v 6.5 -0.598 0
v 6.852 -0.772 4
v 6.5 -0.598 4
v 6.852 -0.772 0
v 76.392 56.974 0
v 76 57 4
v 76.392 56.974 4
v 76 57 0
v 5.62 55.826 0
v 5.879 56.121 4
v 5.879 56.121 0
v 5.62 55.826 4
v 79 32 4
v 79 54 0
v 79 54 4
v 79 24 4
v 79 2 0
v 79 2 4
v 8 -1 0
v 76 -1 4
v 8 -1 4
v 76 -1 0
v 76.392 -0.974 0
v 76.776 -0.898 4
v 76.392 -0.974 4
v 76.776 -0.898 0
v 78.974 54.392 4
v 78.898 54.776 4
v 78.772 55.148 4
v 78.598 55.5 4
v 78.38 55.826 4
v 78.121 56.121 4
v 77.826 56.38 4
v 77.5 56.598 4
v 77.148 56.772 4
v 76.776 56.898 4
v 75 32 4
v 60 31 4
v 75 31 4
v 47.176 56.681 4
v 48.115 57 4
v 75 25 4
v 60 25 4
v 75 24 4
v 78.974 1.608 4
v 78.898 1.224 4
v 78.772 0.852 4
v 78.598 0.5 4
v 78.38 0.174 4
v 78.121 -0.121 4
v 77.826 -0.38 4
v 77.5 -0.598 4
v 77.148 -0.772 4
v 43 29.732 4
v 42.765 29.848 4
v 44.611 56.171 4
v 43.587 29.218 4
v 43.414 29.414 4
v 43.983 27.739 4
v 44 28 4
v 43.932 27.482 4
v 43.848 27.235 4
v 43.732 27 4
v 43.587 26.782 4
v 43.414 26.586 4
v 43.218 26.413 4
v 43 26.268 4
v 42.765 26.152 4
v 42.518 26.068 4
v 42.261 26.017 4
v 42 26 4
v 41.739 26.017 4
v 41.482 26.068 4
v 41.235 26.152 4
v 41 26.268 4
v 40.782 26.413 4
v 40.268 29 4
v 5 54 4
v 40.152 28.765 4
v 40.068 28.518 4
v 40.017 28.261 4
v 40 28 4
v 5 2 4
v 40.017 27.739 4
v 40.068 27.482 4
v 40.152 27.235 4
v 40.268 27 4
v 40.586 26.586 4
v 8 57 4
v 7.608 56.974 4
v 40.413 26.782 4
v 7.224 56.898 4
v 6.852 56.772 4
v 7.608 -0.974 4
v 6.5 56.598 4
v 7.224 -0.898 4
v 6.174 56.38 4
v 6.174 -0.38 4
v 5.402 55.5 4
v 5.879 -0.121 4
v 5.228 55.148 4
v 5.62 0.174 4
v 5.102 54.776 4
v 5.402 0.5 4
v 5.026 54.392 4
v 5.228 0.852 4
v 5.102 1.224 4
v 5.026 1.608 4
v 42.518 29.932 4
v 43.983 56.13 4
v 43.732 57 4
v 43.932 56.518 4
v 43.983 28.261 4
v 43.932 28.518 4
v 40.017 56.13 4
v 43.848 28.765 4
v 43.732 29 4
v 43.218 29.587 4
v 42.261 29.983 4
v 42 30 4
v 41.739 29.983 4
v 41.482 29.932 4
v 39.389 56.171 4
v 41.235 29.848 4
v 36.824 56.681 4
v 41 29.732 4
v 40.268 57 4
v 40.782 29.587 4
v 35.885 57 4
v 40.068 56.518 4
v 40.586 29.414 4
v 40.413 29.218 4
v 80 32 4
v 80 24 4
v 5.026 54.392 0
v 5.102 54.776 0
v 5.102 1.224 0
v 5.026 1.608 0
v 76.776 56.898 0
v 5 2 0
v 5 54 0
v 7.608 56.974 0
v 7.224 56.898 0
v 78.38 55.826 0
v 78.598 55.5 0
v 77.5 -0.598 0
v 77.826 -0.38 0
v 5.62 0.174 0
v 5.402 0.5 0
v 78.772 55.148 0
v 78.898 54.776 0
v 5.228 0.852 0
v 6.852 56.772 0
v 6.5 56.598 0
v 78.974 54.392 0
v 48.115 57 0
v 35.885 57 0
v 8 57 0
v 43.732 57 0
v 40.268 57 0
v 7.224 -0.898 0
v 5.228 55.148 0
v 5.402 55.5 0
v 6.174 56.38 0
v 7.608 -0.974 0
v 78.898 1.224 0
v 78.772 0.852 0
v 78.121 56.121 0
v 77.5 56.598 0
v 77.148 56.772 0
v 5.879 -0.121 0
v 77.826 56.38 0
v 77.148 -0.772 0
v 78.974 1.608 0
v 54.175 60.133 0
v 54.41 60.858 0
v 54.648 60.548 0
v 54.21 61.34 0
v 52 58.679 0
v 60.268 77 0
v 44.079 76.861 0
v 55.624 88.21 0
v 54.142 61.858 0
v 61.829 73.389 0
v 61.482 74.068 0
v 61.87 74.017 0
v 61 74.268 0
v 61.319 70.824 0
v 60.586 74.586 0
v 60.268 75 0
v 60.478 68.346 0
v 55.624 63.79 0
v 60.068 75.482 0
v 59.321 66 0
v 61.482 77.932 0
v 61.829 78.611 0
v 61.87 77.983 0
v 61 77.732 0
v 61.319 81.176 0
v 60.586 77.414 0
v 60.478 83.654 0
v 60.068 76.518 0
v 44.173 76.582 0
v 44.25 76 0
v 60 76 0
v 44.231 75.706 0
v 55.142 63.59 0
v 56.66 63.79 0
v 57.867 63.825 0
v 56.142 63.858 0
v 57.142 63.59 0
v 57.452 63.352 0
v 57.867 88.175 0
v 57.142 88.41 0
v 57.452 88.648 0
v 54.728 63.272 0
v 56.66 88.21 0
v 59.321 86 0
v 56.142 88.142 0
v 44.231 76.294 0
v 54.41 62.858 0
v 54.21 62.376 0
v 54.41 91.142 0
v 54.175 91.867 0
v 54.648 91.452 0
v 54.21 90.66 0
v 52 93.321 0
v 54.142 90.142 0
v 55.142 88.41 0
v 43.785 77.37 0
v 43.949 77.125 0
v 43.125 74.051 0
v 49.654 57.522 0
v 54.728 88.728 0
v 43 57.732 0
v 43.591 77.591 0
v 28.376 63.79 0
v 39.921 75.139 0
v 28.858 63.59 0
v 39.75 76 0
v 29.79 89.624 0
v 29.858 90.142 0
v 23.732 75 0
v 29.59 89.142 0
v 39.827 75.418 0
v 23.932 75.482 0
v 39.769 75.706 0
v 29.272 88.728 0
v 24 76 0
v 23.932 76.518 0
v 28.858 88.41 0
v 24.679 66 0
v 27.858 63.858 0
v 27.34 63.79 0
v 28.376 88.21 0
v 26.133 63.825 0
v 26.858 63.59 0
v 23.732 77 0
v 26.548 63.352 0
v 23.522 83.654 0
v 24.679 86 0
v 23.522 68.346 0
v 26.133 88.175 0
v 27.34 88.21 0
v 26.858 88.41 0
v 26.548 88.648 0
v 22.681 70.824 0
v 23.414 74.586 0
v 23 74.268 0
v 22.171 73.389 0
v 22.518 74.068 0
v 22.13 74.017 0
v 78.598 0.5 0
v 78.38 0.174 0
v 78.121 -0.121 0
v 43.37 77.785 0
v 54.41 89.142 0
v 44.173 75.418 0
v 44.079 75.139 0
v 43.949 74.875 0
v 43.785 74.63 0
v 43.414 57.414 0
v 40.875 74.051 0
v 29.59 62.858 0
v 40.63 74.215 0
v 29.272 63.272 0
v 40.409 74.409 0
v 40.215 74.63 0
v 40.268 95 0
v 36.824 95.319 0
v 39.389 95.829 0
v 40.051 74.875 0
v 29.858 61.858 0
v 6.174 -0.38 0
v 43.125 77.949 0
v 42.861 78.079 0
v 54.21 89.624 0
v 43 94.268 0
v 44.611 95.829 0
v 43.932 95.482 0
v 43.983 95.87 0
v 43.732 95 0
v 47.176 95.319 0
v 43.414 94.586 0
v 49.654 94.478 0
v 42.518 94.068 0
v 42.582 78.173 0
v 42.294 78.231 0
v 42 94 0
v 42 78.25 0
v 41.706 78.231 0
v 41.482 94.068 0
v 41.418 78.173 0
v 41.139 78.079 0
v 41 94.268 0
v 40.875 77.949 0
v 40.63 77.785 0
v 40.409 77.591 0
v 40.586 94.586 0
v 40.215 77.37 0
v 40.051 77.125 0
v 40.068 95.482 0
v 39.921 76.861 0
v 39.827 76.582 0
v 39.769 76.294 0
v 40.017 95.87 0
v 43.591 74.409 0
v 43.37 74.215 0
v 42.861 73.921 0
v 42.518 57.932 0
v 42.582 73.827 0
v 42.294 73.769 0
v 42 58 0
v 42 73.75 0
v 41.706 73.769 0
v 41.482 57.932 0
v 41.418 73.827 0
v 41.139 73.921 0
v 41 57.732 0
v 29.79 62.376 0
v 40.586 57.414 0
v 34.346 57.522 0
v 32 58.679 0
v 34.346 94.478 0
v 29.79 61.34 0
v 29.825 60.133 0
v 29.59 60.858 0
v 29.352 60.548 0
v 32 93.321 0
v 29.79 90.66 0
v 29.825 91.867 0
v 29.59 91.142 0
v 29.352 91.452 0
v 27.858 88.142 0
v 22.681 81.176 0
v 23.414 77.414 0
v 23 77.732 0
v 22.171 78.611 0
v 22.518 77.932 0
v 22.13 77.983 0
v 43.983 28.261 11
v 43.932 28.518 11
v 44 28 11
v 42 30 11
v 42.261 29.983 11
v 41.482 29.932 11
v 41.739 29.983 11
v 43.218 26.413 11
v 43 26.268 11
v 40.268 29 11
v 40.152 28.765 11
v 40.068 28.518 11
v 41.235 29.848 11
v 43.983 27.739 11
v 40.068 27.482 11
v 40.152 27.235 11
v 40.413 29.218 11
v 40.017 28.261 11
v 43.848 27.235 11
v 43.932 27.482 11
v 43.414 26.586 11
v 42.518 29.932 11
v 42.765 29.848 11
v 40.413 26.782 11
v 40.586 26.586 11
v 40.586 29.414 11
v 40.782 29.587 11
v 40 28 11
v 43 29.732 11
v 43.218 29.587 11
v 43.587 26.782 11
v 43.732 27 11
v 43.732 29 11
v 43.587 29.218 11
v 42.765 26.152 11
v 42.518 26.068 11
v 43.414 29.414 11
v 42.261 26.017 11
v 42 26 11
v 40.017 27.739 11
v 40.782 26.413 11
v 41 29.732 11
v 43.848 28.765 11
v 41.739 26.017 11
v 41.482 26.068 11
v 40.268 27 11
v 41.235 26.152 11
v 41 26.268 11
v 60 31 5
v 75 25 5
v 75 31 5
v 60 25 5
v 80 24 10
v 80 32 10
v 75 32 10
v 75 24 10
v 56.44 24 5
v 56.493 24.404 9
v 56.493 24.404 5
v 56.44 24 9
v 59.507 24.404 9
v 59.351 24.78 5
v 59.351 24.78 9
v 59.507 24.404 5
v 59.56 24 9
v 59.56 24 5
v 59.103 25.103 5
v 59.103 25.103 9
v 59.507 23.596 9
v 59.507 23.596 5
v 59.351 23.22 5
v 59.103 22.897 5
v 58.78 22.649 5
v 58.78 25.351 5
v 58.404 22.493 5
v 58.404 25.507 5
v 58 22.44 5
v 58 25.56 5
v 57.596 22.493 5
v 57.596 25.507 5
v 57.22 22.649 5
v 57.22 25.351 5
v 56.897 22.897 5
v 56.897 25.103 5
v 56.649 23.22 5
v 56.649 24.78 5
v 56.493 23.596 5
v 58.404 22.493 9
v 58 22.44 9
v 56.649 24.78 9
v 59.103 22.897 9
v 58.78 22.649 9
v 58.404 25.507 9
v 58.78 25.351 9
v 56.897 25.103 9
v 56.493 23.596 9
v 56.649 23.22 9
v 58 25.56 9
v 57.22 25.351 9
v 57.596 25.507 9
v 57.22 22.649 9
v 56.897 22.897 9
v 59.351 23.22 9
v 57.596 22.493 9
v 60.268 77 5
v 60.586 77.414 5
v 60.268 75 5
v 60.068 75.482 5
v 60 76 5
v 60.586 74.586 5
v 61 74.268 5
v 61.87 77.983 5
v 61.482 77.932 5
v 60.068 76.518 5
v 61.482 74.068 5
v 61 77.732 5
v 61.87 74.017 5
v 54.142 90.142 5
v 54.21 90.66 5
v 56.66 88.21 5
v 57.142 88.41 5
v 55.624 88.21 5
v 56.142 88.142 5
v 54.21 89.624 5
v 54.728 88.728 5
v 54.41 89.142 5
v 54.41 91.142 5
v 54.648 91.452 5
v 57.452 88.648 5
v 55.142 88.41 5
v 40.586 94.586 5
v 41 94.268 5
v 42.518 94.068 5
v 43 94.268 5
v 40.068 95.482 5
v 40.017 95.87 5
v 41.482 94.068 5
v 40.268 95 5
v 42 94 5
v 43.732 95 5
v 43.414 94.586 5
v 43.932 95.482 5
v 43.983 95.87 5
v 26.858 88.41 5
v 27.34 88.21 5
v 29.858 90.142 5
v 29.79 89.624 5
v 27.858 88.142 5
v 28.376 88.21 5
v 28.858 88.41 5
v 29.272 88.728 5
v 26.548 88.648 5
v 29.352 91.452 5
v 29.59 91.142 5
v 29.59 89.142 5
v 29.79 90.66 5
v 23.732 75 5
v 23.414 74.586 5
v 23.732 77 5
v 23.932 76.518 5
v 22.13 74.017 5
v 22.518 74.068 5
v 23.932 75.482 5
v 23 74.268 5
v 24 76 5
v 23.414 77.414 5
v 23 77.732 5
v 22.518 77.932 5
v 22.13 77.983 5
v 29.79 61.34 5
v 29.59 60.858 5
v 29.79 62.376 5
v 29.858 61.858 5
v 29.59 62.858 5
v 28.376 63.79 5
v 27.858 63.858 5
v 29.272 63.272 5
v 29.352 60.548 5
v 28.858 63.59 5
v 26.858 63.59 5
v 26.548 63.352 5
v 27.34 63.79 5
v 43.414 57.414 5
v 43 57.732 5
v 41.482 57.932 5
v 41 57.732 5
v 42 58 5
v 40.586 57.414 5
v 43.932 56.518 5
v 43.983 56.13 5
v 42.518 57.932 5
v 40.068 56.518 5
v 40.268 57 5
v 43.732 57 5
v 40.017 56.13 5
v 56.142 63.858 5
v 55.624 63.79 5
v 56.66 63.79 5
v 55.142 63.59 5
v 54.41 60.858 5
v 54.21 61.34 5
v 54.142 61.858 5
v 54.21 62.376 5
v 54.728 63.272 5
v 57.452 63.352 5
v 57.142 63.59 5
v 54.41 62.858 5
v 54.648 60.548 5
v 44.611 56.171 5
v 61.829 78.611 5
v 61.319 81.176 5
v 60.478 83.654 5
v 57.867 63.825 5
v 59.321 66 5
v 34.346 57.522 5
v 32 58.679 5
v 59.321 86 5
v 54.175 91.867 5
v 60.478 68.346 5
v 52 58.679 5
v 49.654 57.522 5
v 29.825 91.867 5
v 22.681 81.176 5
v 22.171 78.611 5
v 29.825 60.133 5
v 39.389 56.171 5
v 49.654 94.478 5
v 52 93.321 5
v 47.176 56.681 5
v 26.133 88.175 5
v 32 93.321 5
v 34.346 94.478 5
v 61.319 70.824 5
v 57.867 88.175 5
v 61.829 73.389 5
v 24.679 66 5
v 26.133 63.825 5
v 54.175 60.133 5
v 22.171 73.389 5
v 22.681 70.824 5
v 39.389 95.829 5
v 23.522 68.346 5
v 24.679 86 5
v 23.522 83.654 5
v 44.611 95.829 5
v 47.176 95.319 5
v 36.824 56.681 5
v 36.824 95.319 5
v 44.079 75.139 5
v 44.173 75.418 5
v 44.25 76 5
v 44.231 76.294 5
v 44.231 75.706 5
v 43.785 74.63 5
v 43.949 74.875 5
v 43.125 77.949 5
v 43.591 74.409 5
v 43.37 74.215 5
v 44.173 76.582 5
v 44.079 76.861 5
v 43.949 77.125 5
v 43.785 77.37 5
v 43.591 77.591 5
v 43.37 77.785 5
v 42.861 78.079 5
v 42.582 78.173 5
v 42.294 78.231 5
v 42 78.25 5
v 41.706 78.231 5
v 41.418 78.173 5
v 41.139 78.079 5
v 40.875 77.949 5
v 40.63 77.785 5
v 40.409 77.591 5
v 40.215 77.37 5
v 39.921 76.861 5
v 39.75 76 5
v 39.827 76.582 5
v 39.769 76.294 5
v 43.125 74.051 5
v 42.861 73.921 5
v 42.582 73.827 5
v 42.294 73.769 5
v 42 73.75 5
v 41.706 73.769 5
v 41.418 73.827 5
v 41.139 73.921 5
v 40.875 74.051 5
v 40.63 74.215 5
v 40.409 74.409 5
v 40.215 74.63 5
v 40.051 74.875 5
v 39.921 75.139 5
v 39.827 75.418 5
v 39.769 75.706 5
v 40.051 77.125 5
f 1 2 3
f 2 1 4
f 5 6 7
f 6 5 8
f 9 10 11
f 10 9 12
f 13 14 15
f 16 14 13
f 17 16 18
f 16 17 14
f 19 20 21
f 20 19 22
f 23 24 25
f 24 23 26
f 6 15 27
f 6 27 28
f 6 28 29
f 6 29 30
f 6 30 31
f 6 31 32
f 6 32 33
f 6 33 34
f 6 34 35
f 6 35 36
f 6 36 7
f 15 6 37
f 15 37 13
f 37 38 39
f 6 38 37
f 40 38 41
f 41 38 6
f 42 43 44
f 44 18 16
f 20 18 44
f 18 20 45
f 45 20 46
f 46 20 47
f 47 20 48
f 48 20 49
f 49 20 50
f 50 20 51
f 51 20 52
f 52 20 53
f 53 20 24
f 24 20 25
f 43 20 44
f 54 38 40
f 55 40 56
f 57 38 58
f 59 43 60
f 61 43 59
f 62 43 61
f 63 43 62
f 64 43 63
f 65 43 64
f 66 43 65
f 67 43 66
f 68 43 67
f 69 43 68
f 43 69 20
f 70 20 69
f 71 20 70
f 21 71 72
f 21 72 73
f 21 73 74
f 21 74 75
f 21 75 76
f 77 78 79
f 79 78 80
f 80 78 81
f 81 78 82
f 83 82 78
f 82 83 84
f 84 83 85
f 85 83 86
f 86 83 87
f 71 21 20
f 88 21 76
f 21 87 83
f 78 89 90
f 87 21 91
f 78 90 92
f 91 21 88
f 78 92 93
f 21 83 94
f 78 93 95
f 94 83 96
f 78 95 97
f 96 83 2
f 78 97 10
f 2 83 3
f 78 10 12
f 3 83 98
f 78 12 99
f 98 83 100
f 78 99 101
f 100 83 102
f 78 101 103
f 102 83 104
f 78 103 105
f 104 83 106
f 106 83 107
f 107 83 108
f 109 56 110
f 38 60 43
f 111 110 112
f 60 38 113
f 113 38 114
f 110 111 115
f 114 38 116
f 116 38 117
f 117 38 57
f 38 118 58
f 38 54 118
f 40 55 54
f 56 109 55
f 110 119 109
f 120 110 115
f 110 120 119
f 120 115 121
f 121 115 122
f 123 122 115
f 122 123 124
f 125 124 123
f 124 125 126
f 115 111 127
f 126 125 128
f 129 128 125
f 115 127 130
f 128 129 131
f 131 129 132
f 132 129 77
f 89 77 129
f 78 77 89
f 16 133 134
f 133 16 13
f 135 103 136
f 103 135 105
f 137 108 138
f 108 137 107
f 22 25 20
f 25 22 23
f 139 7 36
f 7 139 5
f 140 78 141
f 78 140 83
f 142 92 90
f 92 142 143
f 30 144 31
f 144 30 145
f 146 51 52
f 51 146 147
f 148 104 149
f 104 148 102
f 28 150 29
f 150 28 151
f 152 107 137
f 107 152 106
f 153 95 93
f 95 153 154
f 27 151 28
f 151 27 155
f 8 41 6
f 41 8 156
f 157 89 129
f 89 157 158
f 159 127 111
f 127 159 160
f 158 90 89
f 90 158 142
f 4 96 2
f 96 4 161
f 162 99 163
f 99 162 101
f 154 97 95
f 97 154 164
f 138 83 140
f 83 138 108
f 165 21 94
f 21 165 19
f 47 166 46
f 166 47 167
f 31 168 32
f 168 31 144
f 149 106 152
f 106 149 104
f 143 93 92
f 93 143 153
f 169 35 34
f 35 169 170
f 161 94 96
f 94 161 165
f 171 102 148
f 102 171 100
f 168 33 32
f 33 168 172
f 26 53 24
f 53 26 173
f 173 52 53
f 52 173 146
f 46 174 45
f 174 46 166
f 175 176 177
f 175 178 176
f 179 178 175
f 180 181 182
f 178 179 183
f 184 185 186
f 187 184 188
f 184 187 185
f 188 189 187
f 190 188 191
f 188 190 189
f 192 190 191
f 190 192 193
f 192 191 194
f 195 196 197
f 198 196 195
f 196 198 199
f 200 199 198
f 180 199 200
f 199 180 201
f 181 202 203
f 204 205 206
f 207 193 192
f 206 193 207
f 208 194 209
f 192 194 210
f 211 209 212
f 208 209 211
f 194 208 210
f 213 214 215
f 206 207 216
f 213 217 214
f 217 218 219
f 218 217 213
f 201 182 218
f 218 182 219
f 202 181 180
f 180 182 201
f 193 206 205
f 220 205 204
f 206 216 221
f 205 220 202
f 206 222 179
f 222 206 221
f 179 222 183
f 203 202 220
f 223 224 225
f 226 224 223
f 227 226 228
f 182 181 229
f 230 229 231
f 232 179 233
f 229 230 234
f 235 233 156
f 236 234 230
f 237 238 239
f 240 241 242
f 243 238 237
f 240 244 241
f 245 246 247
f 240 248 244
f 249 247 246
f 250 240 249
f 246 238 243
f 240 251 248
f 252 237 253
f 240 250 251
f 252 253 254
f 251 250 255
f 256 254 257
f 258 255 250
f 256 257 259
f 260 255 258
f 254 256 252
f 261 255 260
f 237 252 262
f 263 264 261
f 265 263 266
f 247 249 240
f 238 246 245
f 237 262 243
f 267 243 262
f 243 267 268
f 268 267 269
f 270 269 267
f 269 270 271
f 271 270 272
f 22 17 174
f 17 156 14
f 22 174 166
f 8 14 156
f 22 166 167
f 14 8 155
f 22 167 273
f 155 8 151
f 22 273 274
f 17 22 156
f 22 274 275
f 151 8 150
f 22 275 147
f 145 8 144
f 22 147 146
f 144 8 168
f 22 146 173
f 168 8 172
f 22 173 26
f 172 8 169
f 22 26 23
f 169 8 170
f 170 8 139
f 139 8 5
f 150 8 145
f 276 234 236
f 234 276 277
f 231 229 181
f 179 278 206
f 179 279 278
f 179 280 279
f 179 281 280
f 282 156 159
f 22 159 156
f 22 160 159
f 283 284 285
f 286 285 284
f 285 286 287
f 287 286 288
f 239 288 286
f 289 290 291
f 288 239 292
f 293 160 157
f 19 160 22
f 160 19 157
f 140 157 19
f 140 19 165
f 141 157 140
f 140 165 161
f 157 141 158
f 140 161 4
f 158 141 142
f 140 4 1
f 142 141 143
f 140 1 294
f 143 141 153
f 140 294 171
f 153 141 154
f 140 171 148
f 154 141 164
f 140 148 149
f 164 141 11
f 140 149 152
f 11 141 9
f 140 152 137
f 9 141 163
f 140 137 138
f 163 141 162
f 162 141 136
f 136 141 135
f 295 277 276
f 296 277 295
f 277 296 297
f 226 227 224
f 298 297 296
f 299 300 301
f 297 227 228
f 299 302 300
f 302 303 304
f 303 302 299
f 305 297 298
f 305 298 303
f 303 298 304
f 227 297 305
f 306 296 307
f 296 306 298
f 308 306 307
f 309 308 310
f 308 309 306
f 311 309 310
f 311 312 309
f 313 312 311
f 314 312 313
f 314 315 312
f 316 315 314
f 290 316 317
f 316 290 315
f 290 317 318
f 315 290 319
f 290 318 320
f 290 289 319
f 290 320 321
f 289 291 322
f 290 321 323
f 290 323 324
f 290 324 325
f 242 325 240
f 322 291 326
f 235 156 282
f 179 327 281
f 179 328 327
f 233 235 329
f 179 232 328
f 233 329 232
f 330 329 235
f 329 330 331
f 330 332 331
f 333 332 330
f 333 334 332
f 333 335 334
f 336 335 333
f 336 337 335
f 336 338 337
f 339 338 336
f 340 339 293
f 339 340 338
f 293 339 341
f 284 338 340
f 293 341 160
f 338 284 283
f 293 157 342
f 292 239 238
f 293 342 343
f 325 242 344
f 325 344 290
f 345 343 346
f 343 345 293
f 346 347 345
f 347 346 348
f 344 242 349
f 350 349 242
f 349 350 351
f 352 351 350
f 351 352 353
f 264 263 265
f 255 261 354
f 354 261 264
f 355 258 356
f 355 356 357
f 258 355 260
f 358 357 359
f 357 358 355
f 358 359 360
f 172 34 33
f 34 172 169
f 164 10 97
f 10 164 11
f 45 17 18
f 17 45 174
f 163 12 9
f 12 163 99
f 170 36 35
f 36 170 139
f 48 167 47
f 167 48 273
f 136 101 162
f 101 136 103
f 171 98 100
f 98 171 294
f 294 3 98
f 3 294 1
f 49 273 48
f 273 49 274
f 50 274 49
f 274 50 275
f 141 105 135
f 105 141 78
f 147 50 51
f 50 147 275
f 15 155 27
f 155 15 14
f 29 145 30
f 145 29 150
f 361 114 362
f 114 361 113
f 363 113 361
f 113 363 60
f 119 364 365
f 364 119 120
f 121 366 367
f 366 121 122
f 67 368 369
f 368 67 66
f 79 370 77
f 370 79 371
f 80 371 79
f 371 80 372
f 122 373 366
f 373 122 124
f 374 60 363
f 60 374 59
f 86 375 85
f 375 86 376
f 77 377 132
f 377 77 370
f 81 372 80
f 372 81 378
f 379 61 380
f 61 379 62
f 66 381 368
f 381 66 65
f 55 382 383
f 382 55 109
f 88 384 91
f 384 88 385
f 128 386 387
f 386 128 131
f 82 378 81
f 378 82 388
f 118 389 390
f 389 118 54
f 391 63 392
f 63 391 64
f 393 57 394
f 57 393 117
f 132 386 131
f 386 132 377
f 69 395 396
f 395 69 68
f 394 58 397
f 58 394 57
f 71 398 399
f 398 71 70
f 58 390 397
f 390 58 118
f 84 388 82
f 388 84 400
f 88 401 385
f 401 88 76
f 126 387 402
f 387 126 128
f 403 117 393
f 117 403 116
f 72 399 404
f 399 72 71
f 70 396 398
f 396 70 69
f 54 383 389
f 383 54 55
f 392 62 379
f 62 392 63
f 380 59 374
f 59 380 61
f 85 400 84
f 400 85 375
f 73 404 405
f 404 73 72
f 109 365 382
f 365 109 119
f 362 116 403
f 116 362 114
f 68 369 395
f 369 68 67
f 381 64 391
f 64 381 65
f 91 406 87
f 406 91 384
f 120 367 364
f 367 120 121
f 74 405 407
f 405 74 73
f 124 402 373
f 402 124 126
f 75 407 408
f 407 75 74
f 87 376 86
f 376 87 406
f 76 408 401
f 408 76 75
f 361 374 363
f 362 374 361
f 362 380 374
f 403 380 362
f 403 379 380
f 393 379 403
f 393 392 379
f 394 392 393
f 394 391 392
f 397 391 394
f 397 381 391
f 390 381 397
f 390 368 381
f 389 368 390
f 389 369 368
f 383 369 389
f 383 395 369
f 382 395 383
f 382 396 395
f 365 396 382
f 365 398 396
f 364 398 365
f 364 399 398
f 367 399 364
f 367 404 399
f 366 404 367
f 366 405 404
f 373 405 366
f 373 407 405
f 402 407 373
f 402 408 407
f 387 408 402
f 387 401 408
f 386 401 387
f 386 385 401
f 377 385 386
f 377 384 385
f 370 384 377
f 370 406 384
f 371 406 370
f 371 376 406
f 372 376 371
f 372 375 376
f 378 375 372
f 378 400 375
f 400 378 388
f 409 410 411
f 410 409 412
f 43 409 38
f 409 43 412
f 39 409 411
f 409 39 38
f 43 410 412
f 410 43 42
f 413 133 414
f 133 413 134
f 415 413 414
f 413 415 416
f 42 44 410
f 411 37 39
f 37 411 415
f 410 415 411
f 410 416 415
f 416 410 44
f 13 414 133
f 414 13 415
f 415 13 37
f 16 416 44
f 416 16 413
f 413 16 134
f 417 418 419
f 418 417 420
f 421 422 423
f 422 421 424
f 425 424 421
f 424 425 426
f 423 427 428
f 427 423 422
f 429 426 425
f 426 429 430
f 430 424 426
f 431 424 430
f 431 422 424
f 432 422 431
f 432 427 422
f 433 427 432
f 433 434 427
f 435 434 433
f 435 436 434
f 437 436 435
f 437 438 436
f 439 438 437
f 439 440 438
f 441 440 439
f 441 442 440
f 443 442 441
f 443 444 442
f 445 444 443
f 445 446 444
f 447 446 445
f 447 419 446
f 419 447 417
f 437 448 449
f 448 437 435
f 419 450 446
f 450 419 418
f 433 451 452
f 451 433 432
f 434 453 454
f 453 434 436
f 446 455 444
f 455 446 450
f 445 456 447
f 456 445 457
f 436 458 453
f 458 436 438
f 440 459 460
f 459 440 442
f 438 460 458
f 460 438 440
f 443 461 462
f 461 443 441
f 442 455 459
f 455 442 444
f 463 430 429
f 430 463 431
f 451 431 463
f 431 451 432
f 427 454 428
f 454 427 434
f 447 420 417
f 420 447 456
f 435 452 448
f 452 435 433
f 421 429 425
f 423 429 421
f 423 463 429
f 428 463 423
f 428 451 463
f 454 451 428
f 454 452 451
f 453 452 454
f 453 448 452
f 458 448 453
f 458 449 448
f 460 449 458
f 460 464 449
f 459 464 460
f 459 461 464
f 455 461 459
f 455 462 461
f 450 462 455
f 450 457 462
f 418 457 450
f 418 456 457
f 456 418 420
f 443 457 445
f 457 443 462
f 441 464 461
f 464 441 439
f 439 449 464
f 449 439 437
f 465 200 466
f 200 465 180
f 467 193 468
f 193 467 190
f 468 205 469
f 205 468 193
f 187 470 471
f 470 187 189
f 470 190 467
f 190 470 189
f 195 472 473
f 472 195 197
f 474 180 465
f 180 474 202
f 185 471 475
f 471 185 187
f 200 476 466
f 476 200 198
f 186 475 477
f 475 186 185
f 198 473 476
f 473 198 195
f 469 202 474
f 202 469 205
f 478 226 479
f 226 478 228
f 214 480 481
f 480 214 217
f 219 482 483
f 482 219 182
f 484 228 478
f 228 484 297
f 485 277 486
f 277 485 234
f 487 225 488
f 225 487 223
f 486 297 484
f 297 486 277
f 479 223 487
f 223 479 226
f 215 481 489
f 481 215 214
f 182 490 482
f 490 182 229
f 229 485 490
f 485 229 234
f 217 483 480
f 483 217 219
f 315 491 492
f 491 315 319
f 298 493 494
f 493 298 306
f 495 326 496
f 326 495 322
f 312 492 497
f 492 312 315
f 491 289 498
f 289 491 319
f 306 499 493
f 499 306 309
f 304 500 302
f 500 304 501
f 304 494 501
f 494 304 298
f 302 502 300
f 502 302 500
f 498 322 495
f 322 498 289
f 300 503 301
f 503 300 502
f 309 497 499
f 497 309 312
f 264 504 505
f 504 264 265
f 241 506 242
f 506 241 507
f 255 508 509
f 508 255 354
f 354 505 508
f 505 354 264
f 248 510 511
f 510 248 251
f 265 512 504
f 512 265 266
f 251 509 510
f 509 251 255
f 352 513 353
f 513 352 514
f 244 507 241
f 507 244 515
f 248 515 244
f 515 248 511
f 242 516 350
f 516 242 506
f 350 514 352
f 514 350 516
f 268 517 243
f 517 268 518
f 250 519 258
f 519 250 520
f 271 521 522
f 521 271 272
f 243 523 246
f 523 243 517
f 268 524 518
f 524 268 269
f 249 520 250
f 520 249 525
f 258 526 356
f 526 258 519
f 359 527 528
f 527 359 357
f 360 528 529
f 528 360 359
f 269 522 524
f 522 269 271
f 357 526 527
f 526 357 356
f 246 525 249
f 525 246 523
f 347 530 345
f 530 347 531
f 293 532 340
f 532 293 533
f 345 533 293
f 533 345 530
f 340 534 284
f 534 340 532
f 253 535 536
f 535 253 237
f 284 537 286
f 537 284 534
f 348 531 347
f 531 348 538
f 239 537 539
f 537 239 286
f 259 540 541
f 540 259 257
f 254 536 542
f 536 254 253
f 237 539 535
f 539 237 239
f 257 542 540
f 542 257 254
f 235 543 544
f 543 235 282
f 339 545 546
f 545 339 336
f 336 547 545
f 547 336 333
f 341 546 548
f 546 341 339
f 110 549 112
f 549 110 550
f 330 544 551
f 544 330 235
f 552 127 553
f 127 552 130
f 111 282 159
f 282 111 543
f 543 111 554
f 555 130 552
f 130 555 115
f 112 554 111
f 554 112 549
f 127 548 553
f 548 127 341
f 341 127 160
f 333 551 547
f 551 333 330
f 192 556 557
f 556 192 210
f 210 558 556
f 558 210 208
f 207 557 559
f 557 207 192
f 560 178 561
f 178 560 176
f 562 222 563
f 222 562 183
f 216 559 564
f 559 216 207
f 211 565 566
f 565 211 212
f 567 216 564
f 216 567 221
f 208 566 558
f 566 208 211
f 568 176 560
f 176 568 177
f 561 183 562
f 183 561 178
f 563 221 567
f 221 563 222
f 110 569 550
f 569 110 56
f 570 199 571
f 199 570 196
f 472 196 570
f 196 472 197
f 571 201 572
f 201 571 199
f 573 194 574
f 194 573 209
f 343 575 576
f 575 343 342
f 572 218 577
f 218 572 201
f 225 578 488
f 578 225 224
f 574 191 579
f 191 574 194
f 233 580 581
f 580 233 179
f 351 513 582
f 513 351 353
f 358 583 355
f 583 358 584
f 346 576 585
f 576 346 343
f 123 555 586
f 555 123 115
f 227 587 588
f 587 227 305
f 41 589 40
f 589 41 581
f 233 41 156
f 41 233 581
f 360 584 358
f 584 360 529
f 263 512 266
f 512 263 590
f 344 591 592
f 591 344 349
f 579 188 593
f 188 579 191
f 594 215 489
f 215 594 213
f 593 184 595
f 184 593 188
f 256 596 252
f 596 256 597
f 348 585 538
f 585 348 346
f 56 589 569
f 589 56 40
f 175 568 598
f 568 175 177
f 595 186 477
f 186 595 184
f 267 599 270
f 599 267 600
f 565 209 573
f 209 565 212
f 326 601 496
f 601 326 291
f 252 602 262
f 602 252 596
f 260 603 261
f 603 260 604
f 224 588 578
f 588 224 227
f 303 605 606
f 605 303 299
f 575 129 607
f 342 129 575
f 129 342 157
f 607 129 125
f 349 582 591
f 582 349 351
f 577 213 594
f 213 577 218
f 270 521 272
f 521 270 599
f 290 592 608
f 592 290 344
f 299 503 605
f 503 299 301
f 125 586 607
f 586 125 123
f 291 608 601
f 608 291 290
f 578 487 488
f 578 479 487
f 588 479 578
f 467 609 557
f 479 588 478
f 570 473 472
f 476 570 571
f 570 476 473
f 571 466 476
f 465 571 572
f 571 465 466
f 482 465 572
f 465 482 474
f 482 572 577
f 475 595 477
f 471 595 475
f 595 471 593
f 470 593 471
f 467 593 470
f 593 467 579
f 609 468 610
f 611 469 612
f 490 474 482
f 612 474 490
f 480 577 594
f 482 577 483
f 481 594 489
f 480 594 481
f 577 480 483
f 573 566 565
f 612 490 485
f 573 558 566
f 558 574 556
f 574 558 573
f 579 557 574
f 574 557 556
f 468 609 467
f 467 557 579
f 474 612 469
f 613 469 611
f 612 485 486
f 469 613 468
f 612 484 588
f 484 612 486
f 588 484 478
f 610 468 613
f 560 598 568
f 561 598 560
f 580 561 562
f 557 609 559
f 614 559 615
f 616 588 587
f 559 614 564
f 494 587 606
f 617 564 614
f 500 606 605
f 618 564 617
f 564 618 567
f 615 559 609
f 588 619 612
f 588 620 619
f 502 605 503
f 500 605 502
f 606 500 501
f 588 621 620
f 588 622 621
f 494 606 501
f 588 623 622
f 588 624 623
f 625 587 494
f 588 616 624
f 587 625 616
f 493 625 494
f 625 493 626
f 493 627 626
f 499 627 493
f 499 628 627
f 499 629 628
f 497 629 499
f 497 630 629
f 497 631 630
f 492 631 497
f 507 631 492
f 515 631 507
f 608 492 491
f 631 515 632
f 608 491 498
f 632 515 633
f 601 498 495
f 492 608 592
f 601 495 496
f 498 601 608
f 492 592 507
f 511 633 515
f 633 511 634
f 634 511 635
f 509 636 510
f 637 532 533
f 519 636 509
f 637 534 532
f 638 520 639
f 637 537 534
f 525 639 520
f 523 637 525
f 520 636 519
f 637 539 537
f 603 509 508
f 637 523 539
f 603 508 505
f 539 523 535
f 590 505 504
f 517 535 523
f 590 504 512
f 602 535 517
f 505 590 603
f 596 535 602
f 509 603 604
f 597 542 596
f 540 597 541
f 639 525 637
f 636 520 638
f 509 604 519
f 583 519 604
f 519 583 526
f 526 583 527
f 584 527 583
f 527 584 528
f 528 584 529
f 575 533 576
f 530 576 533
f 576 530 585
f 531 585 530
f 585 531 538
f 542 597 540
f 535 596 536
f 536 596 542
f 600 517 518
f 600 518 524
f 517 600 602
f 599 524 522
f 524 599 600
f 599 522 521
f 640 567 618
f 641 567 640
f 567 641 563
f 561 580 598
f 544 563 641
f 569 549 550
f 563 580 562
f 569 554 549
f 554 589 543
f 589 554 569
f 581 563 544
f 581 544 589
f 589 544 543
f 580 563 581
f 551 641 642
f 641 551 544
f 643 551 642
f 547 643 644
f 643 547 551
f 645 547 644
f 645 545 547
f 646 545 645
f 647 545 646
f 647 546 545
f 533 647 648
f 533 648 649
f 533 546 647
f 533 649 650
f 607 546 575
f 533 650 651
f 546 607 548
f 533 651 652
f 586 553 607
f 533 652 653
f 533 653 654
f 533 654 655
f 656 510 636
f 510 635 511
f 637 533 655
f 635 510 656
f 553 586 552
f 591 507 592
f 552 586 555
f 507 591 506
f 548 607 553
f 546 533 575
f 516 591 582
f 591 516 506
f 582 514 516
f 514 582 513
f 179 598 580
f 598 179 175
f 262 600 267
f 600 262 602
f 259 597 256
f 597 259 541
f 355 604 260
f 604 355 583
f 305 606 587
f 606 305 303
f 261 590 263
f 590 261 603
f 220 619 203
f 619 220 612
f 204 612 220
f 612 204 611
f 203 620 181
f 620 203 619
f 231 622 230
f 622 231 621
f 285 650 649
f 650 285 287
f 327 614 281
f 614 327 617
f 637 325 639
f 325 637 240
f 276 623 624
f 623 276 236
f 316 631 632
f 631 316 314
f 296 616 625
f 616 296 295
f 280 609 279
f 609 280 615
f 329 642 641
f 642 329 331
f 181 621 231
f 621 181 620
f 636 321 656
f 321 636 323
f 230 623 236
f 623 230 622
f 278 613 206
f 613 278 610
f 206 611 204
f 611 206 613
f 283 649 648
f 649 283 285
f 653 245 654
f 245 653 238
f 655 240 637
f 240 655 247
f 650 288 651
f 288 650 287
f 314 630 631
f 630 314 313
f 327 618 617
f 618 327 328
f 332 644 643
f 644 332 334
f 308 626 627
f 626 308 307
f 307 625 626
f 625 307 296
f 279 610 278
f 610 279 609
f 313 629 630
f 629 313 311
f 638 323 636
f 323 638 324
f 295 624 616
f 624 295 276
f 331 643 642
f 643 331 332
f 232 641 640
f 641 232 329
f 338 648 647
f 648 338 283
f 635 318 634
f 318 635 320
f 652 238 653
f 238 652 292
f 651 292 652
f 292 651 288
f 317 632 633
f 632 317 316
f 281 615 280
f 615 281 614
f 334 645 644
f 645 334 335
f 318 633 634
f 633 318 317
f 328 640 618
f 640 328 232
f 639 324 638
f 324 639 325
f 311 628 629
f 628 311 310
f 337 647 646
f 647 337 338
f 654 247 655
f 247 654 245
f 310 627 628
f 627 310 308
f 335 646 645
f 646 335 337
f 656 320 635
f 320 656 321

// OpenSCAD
/*
Sample 105: Dreh-Rastindexierung — 8 Positionen
Generated from the FDM Mechanical Sample Library.
Units: millimetres.

Override examples:
  openscad -o custom.stl -D 'view="plate"' -D 'render_fn=64' model.scad
  openscad -o preview.png -D 'view="assembly"' model.scad
*/
use <../../../library/fdm_mechanisms.scad>

render_fn = is_undef(render_fn) ? 48 : render_fn;
view = is_undef(view) ? "plate" : view;
$fn = render_fn;

sample_detent_indexer(
    view=view,
    notches=8,
    beam_t=1,
    clearance=0.25
);
